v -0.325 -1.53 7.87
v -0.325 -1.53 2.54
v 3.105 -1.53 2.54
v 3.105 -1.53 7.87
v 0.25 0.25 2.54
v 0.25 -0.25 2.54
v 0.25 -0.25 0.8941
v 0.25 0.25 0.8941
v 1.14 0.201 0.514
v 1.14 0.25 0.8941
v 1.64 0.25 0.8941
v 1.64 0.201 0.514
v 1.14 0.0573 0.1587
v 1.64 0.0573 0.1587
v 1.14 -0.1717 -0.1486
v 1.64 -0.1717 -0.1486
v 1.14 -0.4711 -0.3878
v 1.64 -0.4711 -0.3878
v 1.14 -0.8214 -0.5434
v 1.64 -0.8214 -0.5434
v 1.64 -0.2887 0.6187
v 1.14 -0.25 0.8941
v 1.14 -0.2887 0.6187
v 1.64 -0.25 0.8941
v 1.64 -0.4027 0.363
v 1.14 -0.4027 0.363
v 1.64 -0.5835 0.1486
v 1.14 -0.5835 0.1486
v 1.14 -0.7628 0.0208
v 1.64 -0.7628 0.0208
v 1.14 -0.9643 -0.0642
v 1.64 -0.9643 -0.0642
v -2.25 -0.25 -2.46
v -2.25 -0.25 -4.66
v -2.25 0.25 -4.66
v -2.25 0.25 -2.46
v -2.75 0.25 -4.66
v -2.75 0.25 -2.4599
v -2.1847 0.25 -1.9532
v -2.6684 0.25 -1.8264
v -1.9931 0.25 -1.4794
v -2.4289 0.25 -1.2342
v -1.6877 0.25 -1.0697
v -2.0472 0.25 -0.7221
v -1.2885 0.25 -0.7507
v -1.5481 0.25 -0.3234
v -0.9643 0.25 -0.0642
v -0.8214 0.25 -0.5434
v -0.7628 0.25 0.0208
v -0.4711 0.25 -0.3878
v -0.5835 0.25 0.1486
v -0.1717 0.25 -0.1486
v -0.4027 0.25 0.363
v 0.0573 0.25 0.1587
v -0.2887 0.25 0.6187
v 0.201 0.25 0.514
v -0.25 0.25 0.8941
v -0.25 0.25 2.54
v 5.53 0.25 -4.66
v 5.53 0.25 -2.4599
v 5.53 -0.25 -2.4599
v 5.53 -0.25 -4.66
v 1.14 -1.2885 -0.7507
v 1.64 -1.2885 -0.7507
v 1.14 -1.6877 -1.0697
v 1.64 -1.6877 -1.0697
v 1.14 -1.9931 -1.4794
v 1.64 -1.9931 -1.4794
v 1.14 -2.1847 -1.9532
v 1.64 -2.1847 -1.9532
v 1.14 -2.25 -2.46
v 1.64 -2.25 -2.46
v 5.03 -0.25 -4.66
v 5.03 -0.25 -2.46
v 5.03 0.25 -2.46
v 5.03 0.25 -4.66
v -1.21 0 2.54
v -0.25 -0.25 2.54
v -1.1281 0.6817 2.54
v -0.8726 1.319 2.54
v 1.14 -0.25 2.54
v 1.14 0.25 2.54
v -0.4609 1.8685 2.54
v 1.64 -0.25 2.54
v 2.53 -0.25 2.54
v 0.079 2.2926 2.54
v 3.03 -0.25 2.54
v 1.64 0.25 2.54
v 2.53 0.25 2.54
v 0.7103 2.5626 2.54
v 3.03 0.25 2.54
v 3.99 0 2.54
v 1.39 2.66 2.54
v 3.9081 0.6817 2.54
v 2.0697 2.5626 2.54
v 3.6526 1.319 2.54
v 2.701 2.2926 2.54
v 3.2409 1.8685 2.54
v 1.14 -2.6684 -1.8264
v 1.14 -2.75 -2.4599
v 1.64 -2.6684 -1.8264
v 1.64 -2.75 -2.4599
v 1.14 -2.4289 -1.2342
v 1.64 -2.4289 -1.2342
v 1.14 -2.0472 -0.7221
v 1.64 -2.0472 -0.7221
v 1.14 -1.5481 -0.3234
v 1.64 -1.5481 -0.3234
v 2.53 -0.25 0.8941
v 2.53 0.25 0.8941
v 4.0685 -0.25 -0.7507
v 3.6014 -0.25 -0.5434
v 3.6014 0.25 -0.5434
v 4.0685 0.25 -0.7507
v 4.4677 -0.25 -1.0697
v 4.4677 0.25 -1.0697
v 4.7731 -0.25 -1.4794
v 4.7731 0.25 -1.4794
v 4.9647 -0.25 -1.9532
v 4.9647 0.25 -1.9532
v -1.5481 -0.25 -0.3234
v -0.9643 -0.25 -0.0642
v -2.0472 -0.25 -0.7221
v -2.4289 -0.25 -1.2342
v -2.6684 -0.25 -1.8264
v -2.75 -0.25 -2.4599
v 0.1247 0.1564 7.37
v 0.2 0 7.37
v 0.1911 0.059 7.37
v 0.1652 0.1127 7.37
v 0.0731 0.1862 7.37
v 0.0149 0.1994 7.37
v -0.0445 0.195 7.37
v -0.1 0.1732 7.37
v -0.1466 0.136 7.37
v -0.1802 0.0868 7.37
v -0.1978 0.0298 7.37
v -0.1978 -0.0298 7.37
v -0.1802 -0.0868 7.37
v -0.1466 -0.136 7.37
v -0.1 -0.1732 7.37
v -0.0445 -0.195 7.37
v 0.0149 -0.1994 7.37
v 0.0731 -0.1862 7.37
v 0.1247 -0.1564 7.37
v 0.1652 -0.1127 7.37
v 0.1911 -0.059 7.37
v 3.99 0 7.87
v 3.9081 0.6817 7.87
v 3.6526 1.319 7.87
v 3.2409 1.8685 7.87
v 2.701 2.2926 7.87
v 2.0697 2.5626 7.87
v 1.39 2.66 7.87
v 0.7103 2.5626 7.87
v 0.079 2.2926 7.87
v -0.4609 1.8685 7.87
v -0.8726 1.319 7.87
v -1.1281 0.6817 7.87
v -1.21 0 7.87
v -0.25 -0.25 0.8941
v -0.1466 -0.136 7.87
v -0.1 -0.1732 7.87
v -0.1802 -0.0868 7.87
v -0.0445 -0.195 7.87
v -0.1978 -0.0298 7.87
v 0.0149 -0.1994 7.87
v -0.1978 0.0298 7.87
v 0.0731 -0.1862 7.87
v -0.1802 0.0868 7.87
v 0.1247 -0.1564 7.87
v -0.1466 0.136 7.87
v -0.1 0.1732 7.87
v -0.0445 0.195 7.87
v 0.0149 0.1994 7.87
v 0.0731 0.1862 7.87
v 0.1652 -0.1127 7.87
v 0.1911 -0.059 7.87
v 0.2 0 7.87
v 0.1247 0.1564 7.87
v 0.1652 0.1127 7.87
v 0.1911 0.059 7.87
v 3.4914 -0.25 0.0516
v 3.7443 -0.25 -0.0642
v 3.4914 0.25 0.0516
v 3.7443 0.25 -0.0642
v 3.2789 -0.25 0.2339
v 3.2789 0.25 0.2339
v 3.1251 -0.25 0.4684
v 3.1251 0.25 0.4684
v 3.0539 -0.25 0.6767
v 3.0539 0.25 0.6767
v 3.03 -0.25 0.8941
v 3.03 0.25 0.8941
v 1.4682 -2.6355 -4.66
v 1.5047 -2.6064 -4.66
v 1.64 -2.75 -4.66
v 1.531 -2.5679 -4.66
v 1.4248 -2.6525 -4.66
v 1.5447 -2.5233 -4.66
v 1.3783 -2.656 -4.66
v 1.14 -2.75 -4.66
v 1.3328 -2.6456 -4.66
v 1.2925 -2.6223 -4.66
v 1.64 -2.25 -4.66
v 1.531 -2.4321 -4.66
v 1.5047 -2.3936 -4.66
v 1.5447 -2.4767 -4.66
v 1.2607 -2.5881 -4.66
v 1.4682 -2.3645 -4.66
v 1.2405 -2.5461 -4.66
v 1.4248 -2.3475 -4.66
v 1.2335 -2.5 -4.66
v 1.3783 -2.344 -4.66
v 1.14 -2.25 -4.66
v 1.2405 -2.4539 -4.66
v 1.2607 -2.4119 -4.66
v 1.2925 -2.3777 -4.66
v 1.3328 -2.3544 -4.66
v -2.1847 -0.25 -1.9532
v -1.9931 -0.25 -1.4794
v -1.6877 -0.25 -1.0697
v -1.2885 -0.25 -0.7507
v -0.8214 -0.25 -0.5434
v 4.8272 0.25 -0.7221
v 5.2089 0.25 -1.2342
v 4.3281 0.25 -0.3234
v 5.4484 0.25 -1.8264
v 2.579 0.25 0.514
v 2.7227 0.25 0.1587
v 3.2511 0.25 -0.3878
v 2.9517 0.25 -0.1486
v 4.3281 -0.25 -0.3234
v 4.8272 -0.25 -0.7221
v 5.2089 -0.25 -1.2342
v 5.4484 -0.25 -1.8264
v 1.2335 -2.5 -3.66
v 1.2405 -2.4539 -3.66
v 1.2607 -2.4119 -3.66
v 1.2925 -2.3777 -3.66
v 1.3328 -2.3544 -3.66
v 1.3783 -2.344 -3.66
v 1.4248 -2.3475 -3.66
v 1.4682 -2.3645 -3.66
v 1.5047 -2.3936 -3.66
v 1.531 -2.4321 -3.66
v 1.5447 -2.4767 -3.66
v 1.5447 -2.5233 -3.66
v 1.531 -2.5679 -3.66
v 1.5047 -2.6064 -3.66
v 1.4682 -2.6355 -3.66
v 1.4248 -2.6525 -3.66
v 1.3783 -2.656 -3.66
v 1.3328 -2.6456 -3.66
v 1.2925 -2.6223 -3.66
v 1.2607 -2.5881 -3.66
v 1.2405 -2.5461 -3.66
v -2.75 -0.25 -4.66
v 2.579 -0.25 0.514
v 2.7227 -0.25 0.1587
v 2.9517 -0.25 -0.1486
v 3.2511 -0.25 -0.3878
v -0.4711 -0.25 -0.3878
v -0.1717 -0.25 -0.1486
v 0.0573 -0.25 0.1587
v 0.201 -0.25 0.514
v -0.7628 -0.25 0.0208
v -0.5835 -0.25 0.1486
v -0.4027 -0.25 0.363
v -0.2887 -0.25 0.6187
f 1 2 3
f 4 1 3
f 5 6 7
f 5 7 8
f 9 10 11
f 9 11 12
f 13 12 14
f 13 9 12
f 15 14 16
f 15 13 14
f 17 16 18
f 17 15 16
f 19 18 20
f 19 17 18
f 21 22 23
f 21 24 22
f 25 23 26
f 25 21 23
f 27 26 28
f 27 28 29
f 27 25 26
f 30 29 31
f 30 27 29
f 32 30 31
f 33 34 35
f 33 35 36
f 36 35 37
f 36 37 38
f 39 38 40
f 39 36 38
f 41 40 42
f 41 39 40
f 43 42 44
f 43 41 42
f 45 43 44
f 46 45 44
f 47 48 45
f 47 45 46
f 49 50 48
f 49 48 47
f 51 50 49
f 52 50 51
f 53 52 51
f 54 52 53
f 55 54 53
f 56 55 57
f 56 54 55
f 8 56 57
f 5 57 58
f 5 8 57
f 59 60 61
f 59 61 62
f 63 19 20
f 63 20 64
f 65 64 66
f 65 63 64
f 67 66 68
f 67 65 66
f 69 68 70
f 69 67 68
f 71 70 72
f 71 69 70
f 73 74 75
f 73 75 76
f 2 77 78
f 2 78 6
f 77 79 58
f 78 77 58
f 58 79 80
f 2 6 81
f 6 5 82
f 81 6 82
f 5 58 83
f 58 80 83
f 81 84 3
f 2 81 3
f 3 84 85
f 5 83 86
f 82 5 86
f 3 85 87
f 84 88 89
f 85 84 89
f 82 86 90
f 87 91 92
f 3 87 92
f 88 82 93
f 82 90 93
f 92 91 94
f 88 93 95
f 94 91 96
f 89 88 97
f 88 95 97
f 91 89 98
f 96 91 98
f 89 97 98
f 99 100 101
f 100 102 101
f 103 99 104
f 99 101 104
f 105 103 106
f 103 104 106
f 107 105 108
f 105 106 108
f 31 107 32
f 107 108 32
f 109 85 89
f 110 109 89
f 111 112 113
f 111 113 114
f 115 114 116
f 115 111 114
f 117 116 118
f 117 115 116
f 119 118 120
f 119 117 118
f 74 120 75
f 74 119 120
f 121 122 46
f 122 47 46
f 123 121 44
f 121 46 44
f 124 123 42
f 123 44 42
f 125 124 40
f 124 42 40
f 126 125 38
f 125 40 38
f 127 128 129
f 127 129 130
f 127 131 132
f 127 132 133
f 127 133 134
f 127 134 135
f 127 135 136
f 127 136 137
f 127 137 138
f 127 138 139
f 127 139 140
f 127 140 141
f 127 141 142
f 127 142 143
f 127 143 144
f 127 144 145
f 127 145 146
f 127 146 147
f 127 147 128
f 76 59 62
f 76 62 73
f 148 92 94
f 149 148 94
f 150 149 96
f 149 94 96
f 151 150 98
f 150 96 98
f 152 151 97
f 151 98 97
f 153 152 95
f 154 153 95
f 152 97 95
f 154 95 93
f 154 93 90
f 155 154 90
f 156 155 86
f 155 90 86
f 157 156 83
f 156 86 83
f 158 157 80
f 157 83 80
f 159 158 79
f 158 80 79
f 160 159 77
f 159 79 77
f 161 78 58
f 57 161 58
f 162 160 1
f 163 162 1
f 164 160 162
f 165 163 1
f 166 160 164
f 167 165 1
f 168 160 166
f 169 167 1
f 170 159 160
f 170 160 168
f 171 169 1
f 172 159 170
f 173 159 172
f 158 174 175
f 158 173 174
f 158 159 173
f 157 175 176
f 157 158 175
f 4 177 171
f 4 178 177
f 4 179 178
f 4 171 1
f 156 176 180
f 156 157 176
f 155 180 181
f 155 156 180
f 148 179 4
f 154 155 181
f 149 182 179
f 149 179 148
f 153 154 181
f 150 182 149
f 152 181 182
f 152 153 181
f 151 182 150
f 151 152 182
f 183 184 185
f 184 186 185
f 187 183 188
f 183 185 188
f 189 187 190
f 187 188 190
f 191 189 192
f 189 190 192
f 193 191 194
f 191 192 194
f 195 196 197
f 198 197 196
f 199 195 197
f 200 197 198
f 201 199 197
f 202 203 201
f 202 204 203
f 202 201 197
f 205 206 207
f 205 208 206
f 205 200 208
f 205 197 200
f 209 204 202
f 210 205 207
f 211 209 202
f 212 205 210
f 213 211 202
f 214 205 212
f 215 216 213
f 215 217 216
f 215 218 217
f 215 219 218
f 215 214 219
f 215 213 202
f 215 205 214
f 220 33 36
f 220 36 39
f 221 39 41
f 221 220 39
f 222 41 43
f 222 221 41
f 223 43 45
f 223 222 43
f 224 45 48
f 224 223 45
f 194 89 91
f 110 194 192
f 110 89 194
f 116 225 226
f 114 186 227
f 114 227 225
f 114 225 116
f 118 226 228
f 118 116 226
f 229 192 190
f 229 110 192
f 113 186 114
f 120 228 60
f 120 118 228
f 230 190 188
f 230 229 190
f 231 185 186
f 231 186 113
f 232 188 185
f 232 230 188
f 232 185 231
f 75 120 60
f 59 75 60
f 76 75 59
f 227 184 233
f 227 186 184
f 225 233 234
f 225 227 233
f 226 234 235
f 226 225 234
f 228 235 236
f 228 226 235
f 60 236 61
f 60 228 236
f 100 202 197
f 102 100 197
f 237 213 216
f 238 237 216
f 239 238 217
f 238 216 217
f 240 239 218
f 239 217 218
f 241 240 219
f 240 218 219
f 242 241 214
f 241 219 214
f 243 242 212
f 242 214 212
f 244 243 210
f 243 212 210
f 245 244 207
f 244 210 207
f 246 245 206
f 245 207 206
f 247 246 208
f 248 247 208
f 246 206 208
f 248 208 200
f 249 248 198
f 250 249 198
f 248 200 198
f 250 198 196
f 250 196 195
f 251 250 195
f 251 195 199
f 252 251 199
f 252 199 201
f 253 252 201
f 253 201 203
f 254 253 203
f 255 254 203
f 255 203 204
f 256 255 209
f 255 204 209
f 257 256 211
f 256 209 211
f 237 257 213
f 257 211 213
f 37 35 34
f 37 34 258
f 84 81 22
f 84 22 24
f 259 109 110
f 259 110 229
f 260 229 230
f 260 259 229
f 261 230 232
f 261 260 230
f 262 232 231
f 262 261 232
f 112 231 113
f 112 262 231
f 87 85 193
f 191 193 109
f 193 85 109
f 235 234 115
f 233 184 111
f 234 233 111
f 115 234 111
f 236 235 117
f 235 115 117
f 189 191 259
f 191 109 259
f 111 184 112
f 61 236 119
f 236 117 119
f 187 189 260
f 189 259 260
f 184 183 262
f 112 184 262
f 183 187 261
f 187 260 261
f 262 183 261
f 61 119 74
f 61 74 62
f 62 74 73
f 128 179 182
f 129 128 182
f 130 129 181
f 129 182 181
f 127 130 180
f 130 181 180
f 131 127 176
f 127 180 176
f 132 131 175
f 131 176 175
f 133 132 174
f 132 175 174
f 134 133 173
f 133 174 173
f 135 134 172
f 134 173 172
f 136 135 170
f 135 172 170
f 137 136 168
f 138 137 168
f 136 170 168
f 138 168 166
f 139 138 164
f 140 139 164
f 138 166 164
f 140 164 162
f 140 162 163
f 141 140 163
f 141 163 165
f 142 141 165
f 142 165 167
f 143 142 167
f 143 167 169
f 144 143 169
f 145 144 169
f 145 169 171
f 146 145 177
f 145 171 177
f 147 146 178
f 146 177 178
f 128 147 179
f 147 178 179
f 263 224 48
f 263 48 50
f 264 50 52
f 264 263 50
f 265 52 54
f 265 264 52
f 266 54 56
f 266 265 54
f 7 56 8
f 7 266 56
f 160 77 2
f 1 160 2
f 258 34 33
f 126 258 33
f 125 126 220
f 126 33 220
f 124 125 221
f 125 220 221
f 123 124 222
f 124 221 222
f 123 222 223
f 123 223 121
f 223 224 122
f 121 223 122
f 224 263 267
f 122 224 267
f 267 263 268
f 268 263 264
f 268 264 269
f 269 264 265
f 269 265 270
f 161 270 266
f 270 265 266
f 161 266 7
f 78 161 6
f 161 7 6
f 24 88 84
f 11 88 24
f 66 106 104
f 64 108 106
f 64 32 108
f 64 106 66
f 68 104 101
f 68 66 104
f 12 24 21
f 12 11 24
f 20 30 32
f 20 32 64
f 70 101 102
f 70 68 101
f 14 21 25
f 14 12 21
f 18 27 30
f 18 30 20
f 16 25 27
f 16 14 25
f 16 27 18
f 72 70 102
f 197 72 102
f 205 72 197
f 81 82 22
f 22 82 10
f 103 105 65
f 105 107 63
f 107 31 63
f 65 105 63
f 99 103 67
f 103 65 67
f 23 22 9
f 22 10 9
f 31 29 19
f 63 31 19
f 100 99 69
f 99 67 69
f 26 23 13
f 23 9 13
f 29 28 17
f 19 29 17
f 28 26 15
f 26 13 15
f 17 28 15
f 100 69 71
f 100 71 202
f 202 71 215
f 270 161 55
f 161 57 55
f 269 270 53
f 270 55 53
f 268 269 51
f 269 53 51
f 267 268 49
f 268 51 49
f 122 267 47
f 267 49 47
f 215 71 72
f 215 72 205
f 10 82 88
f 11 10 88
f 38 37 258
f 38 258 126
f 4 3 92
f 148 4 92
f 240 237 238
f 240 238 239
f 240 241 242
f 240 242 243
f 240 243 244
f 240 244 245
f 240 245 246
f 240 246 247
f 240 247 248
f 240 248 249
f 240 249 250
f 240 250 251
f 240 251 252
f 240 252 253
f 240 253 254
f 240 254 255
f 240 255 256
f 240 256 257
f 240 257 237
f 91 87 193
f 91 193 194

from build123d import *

# Parameters (mm, degrees)
EXTRUDE_1_DEPTH     = 5.33
SKETCH_1_W          = 0.5
SKETCH_1_H          = 0.5
EXTRUDE_2_DEPTH     = 2.54
SKETCH_1_2_W        = 0.5
SKETCH_1_2_H        = 0.5
EXTRUDE_3_DEPTH     = 10.16
SKETCH_4_R          = 0.2
CUT_EXTRUDE_1_DEPTH = 0.5
SKETCH_5_W          = 0.5
SKETCH_5_H          = 10.2
EXTRUDE_4_DEPTH     = 2.5
SKETCH_6_W          = 10.2
SKETCH_6_H          = 0.5
EXTRUDE_5_DEPTH     = 2.5
SKETCH_7_W          = 10.2
SKETCH_7_H          = 0.5
EXTRUDE_6_DEPTH     = 2.5
FILLET_1_R          = 2.5
FILLET_2_R          = 1
CUT_EXTRUDE_2_DEPTH = 2.5
CUT_EXTRUDE_3_DEPTH = 1
SKETCH_11_W         = 10.061772152
SKETCH_11_H         = 6.60723038
CUT_EXTRUDE_4_DEPTH = 5.5
SKETCH_12_R         = 0.156456915
CUT_EXTRUDE_5_DEPTH = 1


with BuildPart() as part:
    # Эскиз3 → Вытянуть1 (new body)
    with BuildSketch(Plane.XY.offset(2.54)):
        with BuildLine():
            Line((-0.325, -1.53), (3.105, -1.53))
            Line((3.105, -1.53), (3.99, 0))
            ThreePointArc((3.99, 0), (3.240904038, 1.868477631), (1.39, 2.66))
            ThreePointArc((1.39, 2.66), (-0.460904038, 1.868477631), (-1.21, 0))
            Line((-1.21, 0), (-0.325, -1.53))
        make_face()
    extrude(amount=EXTRUDE_1_DEPTH)

    # Эскиз1 → Вытянуть2 (add)
    with BuildSketch(Plane.XY):
        with Locations((1.39, 0)):
            Rectangle(SKETCH_1_W, SKETCH_1_H)
        Rectangle(SKETCH_1_W, SKETCH_1_H)
        with Locations((2.78, 0)):
            Rectangle(SKETCH_1_W, SKETCH_1_H)
    extrude(amount=EXTRUDE_2_DEPTH)

    # Эскиз1<2> → Вытянуть3 (add)
    with BuildSketch(Plane.XY):
        with Locations((1.39, 0)):
            Rectangle(SKETCH_1_2_W, SKETCH_1_2_H)
        Rectangle(SKETCH_1_2_W, SKETCH_1_2_H)
        with Locations((2.78, 0)):
            Rectangle(SKETCH_1_2_W, SKETCH_1_2_H)
    extrude(amount=-EXTRUDE_3_DEPTH)

    # Эскиз4 → Вырез-Вытянуть1 (cut)
    with BuildSketch(Plane.XY.offset(7.87)):
        Circle(SKETCH_4_R)
    extrude(amount=-CUT_EXTRUDE_1_DEPTH, mode=Mode.SUBTRACT)

    # Эскиз5 → Вытянуть4 (add)
    with BuildSketch(Plane(origin=(0, -0.25, 0), x_dir=(1, 0, 0), z_dir=(0, 1, 0))):
        with Locations((1.39, 5.06)):
            Rectangle(SKETCH_5_W, SKETCH_5_H)
    extrude(amount=-EXTRUDE_4_DEPTH)

    # Эскиз6 → Вытянуть5 (add)
    with BuildSketch(Plane.ZY.offset(0.25)):
        with Locations((-5.06, 0)):
            Rectangle(SKETCH_6_W, SKETCH_6_H)
    extrude(amount=EXTRUDE_5_DEPTH)

    # Эскиз7 → Вытянуть6 (add)
    with BuildSketch(Plane(origin=(3.03, 0, 0), x_dir=(0, 0, -1), z_dir=(1, 0, 0))):
        with Locations((5.06, 0)):
            Rectangle(SKETCH_7_W, SKETCH_7_H)
    extrude(amount=EXTRUDE_6_DEPTH)

    # Скругление1
    fillet_1_edges = [part.edges().sort_by_distance(p)[0] for p in [
        (5.53, 0, 0.04),
        (-2.75, 0, 0.04),
        (1.39, -2.75, 0.04),
    ]]
    fillet(fillet_1_edges, radius=FILLET_1_R - 0.0001)  # a hair under: the kernel refuses the full size

    # Скругление2
    fillet_2_edges = [part.edges().sort_by_distance(p)[0] for p in [
        (-0.25, 0, 0.04),
        (3.03, 0, 0.04),
        (1.39, -0.25, 0.04),
    ]]
    fillet(fillet_2_edges, radius=FILLET_2_R)

    # Эскиз9 → Вырез-Вытянуть2 (cut)
    with BuildSketch(Plane.XZ.offset(0.25)):
        with BuildLine():
            Line((-2.25, -10.16), (-2.25, -2.46))
            ThreePointArc((-2.25, -2.46), (-1.853567451, -1.264771391), (-0.821428571, -0.543370305))
            ThreePointArc((-0.821428571, -0.543370305), (-0.047324411, -0.002319491), (0.25, 0.894101966))
            Line((0.25, 0.894101966), (0.25, -10.16))
            Line((0.25, -10.16), (-2.25, -10.16))
        make_face()
        with BuildLine():
            Line((5.03, -10.16), (2.53, -10.16))
            Line((2.53, -10.16), (2.53, 0.894101966))
            ThreePointArc((2.53, 0.894101966), (2.827324411, -0.002319491), (3.601428571, -0.543370305))
            ThreePointArc((3.601428571, -0.543370305), (4.633567451, -1.264771391), (5.03, -2.46))
            Line((5.03, -2.46), (5.03, -10.16))
        make_face()
    extrude(amount=-CUT_EXTRUDE_2_DEPTH, mode=Mode.SUBTRACT)

    # Эскиз10 → Вырез-Вытянуть3 (cut)
    with BuildSketch(Plane.ZY.offset(-1.14)):
        with BuildLine():
            Line((-2.46, -2.25), (-10.16, -2.25))
            Line((-10.16, -2.25), (-10.16, 0.25))
            Line((-10.16, 0.25), (0.894101966, 0.25))
            ThreePointArc((0.894101966, 0.25), (-0.002319491, -0.047324411), (-0.543370305, -0.821428571))
            ThreePointArc((-0.543370305, -0.821428571), (-1.264771391, -1.853567451), (-2.46, -2.25))
        make_face()
    extrude(amount=-CUT_EXTRUDE_3_DEPTH, mode=Mode.SUBTRACT)

    # Эскиз11 → Вырез-Вытянуть4 (cut)
    with BuildSketch(Plane(origin=(0, 0, -10.16), x_dir=(-1, 0, 0), z_dir=(0, 0, -1))):
        with Locations((-1.088146835, -1.646498734)):
            Rectangle(SKETCH_11_W, SKETCH_11_H)
    extrude(amount=-CUT_EXTRUDE_4_DEPTH, mode=Mode.SUBTRACT)

    # Эскиз12 → Вырез-Вытянуть5 (cut)
    with BuildSketch(Plane(origin=(0, 0, -4.66), x_dir=(-1, 0, 0), z_dir=(0, 0, -1))):
        with Locations((-1.39, -2.5)):
            Circle(SKETCH_12_R)
    extrude(amount=-CUT_EXTRUDE_5_DEPTH, mode=Mode.SUBTRACT)


solid = part.part
